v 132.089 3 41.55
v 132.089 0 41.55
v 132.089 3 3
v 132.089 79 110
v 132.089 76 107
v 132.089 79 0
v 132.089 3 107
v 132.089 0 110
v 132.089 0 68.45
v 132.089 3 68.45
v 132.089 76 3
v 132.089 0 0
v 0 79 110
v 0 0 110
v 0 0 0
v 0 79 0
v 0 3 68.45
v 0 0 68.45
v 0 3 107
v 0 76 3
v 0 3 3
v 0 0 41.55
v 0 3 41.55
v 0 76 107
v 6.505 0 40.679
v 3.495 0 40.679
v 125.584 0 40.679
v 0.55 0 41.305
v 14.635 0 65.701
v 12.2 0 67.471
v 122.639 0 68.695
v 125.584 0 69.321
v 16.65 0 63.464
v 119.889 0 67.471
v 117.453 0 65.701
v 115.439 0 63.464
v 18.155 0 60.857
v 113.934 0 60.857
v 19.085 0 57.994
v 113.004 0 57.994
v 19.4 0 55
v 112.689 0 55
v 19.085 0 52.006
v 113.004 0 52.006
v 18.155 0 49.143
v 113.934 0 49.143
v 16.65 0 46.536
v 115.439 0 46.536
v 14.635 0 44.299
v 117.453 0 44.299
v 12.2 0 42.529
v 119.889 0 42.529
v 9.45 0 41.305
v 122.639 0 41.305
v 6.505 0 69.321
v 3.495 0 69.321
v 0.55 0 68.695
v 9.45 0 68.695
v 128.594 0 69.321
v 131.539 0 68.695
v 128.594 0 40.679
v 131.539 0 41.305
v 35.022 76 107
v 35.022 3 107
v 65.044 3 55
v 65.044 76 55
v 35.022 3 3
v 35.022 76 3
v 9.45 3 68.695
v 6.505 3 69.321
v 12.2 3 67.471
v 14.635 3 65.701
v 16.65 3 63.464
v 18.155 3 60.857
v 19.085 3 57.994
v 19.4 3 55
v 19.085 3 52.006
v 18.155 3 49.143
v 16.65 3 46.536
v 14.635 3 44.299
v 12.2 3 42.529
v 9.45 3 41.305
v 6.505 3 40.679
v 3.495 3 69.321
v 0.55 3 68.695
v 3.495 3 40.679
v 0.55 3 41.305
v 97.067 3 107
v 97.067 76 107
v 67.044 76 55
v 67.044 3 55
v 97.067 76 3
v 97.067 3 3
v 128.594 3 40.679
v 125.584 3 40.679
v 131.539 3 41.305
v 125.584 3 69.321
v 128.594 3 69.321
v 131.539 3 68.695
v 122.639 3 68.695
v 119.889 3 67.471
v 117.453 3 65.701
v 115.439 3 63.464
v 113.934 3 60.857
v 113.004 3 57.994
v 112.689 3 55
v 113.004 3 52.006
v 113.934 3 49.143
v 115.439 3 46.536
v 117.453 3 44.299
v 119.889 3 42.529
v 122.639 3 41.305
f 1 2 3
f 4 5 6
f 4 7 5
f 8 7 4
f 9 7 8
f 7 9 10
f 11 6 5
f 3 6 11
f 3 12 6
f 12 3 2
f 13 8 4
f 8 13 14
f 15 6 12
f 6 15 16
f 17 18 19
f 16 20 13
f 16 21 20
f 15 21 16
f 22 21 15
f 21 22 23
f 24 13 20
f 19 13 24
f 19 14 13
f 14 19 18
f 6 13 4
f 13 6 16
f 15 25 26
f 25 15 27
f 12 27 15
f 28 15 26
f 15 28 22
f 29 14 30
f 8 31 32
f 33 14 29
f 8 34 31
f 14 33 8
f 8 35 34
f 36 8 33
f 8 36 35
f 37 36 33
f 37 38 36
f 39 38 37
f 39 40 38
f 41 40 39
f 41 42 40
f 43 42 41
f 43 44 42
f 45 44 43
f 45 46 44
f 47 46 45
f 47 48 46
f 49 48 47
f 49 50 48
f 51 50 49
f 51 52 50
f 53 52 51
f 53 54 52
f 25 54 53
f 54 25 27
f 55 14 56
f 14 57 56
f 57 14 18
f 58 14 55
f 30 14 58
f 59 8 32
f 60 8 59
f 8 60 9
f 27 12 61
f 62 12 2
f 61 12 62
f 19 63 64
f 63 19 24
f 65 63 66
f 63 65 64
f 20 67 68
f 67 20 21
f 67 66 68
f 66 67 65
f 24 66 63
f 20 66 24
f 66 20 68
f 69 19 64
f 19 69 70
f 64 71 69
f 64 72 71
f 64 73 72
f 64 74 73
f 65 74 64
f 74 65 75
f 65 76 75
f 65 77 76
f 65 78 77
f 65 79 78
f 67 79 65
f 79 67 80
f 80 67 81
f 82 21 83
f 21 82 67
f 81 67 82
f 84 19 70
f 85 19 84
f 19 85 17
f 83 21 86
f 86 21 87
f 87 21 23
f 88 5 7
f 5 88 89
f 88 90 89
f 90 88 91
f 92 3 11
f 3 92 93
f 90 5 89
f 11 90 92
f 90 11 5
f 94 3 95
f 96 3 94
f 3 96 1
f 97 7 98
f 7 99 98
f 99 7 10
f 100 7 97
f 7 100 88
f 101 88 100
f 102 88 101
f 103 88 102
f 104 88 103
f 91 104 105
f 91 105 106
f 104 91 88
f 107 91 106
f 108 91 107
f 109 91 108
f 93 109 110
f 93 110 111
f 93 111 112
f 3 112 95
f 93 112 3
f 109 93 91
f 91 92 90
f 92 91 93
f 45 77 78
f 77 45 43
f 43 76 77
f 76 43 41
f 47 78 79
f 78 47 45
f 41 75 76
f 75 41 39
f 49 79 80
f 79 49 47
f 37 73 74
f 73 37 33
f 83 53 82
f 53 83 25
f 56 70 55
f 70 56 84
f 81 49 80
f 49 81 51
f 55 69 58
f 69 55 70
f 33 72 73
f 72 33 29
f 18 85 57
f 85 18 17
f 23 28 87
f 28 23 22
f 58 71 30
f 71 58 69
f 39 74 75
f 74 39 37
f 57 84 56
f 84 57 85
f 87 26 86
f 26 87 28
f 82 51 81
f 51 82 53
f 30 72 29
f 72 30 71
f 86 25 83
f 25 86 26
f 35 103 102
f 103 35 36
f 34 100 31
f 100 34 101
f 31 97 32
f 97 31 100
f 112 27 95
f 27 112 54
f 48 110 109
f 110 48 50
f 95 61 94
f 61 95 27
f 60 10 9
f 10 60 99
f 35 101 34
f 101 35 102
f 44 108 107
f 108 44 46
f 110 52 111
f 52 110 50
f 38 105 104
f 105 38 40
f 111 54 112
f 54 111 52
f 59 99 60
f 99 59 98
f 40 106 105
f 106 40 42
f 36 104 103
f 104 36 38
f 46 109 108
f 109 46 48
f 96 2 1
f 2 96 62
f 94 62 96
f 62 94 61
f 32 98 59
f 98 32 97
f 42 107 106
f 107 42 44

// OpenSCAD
include <../libs/pw_primitives.scad>;

hex_side2side = 104;  hex_side2r = hex_side2side / 2;
hex_thick = 73;  shaft_thick = 28.8;  shaft_x_off = 5;
// block_len = 135;  block_wid = 79;  block_high = 110;

side_thick = 3;
block_len = hex_side2side / sin(60) + side_thick * 4;
block_wid = hex_thick + side_thick * 2;
block_high = hex_side2side + side_thick * 2;
// block_y_off = (block_wid + hex_thick) / 2;
block_y_off = hex_thick + side_thick;
// shaft_y_off = (block_wid - hex_thick) / 2 + epsilo2;
shaft_y_off = side_thick + epsilo2;
block_z_cen = block_high/2;  

difference() {
    cube([block_len, block_wid, block_high]);
    // the two hexagons of the weight
    translate([shaft_x_off, block_y_off, block_z_cen]) rot(x=90)
      hexagon_solid(height=hex_thick, side2side=hex_side2side);
    translate([block_len-shaft_x_off, block_y_off, block_z_cen]) rot(x=90)
      hexagon_solid(height=hex_thick, side2side=hex_side2side);
    // the two shafts
    translate([shaft_x_off, -epsilon, block_z_cen]) rot(x=-90)
      cylinder(h=shaft_y_off, d=shaft_thick);
    translate([block_len-shaft_x_off, -epsilon, block_z_cen]) rot(x=-90)
      cylinder(h=shaft_y_off, d=shaft_thick);
}
